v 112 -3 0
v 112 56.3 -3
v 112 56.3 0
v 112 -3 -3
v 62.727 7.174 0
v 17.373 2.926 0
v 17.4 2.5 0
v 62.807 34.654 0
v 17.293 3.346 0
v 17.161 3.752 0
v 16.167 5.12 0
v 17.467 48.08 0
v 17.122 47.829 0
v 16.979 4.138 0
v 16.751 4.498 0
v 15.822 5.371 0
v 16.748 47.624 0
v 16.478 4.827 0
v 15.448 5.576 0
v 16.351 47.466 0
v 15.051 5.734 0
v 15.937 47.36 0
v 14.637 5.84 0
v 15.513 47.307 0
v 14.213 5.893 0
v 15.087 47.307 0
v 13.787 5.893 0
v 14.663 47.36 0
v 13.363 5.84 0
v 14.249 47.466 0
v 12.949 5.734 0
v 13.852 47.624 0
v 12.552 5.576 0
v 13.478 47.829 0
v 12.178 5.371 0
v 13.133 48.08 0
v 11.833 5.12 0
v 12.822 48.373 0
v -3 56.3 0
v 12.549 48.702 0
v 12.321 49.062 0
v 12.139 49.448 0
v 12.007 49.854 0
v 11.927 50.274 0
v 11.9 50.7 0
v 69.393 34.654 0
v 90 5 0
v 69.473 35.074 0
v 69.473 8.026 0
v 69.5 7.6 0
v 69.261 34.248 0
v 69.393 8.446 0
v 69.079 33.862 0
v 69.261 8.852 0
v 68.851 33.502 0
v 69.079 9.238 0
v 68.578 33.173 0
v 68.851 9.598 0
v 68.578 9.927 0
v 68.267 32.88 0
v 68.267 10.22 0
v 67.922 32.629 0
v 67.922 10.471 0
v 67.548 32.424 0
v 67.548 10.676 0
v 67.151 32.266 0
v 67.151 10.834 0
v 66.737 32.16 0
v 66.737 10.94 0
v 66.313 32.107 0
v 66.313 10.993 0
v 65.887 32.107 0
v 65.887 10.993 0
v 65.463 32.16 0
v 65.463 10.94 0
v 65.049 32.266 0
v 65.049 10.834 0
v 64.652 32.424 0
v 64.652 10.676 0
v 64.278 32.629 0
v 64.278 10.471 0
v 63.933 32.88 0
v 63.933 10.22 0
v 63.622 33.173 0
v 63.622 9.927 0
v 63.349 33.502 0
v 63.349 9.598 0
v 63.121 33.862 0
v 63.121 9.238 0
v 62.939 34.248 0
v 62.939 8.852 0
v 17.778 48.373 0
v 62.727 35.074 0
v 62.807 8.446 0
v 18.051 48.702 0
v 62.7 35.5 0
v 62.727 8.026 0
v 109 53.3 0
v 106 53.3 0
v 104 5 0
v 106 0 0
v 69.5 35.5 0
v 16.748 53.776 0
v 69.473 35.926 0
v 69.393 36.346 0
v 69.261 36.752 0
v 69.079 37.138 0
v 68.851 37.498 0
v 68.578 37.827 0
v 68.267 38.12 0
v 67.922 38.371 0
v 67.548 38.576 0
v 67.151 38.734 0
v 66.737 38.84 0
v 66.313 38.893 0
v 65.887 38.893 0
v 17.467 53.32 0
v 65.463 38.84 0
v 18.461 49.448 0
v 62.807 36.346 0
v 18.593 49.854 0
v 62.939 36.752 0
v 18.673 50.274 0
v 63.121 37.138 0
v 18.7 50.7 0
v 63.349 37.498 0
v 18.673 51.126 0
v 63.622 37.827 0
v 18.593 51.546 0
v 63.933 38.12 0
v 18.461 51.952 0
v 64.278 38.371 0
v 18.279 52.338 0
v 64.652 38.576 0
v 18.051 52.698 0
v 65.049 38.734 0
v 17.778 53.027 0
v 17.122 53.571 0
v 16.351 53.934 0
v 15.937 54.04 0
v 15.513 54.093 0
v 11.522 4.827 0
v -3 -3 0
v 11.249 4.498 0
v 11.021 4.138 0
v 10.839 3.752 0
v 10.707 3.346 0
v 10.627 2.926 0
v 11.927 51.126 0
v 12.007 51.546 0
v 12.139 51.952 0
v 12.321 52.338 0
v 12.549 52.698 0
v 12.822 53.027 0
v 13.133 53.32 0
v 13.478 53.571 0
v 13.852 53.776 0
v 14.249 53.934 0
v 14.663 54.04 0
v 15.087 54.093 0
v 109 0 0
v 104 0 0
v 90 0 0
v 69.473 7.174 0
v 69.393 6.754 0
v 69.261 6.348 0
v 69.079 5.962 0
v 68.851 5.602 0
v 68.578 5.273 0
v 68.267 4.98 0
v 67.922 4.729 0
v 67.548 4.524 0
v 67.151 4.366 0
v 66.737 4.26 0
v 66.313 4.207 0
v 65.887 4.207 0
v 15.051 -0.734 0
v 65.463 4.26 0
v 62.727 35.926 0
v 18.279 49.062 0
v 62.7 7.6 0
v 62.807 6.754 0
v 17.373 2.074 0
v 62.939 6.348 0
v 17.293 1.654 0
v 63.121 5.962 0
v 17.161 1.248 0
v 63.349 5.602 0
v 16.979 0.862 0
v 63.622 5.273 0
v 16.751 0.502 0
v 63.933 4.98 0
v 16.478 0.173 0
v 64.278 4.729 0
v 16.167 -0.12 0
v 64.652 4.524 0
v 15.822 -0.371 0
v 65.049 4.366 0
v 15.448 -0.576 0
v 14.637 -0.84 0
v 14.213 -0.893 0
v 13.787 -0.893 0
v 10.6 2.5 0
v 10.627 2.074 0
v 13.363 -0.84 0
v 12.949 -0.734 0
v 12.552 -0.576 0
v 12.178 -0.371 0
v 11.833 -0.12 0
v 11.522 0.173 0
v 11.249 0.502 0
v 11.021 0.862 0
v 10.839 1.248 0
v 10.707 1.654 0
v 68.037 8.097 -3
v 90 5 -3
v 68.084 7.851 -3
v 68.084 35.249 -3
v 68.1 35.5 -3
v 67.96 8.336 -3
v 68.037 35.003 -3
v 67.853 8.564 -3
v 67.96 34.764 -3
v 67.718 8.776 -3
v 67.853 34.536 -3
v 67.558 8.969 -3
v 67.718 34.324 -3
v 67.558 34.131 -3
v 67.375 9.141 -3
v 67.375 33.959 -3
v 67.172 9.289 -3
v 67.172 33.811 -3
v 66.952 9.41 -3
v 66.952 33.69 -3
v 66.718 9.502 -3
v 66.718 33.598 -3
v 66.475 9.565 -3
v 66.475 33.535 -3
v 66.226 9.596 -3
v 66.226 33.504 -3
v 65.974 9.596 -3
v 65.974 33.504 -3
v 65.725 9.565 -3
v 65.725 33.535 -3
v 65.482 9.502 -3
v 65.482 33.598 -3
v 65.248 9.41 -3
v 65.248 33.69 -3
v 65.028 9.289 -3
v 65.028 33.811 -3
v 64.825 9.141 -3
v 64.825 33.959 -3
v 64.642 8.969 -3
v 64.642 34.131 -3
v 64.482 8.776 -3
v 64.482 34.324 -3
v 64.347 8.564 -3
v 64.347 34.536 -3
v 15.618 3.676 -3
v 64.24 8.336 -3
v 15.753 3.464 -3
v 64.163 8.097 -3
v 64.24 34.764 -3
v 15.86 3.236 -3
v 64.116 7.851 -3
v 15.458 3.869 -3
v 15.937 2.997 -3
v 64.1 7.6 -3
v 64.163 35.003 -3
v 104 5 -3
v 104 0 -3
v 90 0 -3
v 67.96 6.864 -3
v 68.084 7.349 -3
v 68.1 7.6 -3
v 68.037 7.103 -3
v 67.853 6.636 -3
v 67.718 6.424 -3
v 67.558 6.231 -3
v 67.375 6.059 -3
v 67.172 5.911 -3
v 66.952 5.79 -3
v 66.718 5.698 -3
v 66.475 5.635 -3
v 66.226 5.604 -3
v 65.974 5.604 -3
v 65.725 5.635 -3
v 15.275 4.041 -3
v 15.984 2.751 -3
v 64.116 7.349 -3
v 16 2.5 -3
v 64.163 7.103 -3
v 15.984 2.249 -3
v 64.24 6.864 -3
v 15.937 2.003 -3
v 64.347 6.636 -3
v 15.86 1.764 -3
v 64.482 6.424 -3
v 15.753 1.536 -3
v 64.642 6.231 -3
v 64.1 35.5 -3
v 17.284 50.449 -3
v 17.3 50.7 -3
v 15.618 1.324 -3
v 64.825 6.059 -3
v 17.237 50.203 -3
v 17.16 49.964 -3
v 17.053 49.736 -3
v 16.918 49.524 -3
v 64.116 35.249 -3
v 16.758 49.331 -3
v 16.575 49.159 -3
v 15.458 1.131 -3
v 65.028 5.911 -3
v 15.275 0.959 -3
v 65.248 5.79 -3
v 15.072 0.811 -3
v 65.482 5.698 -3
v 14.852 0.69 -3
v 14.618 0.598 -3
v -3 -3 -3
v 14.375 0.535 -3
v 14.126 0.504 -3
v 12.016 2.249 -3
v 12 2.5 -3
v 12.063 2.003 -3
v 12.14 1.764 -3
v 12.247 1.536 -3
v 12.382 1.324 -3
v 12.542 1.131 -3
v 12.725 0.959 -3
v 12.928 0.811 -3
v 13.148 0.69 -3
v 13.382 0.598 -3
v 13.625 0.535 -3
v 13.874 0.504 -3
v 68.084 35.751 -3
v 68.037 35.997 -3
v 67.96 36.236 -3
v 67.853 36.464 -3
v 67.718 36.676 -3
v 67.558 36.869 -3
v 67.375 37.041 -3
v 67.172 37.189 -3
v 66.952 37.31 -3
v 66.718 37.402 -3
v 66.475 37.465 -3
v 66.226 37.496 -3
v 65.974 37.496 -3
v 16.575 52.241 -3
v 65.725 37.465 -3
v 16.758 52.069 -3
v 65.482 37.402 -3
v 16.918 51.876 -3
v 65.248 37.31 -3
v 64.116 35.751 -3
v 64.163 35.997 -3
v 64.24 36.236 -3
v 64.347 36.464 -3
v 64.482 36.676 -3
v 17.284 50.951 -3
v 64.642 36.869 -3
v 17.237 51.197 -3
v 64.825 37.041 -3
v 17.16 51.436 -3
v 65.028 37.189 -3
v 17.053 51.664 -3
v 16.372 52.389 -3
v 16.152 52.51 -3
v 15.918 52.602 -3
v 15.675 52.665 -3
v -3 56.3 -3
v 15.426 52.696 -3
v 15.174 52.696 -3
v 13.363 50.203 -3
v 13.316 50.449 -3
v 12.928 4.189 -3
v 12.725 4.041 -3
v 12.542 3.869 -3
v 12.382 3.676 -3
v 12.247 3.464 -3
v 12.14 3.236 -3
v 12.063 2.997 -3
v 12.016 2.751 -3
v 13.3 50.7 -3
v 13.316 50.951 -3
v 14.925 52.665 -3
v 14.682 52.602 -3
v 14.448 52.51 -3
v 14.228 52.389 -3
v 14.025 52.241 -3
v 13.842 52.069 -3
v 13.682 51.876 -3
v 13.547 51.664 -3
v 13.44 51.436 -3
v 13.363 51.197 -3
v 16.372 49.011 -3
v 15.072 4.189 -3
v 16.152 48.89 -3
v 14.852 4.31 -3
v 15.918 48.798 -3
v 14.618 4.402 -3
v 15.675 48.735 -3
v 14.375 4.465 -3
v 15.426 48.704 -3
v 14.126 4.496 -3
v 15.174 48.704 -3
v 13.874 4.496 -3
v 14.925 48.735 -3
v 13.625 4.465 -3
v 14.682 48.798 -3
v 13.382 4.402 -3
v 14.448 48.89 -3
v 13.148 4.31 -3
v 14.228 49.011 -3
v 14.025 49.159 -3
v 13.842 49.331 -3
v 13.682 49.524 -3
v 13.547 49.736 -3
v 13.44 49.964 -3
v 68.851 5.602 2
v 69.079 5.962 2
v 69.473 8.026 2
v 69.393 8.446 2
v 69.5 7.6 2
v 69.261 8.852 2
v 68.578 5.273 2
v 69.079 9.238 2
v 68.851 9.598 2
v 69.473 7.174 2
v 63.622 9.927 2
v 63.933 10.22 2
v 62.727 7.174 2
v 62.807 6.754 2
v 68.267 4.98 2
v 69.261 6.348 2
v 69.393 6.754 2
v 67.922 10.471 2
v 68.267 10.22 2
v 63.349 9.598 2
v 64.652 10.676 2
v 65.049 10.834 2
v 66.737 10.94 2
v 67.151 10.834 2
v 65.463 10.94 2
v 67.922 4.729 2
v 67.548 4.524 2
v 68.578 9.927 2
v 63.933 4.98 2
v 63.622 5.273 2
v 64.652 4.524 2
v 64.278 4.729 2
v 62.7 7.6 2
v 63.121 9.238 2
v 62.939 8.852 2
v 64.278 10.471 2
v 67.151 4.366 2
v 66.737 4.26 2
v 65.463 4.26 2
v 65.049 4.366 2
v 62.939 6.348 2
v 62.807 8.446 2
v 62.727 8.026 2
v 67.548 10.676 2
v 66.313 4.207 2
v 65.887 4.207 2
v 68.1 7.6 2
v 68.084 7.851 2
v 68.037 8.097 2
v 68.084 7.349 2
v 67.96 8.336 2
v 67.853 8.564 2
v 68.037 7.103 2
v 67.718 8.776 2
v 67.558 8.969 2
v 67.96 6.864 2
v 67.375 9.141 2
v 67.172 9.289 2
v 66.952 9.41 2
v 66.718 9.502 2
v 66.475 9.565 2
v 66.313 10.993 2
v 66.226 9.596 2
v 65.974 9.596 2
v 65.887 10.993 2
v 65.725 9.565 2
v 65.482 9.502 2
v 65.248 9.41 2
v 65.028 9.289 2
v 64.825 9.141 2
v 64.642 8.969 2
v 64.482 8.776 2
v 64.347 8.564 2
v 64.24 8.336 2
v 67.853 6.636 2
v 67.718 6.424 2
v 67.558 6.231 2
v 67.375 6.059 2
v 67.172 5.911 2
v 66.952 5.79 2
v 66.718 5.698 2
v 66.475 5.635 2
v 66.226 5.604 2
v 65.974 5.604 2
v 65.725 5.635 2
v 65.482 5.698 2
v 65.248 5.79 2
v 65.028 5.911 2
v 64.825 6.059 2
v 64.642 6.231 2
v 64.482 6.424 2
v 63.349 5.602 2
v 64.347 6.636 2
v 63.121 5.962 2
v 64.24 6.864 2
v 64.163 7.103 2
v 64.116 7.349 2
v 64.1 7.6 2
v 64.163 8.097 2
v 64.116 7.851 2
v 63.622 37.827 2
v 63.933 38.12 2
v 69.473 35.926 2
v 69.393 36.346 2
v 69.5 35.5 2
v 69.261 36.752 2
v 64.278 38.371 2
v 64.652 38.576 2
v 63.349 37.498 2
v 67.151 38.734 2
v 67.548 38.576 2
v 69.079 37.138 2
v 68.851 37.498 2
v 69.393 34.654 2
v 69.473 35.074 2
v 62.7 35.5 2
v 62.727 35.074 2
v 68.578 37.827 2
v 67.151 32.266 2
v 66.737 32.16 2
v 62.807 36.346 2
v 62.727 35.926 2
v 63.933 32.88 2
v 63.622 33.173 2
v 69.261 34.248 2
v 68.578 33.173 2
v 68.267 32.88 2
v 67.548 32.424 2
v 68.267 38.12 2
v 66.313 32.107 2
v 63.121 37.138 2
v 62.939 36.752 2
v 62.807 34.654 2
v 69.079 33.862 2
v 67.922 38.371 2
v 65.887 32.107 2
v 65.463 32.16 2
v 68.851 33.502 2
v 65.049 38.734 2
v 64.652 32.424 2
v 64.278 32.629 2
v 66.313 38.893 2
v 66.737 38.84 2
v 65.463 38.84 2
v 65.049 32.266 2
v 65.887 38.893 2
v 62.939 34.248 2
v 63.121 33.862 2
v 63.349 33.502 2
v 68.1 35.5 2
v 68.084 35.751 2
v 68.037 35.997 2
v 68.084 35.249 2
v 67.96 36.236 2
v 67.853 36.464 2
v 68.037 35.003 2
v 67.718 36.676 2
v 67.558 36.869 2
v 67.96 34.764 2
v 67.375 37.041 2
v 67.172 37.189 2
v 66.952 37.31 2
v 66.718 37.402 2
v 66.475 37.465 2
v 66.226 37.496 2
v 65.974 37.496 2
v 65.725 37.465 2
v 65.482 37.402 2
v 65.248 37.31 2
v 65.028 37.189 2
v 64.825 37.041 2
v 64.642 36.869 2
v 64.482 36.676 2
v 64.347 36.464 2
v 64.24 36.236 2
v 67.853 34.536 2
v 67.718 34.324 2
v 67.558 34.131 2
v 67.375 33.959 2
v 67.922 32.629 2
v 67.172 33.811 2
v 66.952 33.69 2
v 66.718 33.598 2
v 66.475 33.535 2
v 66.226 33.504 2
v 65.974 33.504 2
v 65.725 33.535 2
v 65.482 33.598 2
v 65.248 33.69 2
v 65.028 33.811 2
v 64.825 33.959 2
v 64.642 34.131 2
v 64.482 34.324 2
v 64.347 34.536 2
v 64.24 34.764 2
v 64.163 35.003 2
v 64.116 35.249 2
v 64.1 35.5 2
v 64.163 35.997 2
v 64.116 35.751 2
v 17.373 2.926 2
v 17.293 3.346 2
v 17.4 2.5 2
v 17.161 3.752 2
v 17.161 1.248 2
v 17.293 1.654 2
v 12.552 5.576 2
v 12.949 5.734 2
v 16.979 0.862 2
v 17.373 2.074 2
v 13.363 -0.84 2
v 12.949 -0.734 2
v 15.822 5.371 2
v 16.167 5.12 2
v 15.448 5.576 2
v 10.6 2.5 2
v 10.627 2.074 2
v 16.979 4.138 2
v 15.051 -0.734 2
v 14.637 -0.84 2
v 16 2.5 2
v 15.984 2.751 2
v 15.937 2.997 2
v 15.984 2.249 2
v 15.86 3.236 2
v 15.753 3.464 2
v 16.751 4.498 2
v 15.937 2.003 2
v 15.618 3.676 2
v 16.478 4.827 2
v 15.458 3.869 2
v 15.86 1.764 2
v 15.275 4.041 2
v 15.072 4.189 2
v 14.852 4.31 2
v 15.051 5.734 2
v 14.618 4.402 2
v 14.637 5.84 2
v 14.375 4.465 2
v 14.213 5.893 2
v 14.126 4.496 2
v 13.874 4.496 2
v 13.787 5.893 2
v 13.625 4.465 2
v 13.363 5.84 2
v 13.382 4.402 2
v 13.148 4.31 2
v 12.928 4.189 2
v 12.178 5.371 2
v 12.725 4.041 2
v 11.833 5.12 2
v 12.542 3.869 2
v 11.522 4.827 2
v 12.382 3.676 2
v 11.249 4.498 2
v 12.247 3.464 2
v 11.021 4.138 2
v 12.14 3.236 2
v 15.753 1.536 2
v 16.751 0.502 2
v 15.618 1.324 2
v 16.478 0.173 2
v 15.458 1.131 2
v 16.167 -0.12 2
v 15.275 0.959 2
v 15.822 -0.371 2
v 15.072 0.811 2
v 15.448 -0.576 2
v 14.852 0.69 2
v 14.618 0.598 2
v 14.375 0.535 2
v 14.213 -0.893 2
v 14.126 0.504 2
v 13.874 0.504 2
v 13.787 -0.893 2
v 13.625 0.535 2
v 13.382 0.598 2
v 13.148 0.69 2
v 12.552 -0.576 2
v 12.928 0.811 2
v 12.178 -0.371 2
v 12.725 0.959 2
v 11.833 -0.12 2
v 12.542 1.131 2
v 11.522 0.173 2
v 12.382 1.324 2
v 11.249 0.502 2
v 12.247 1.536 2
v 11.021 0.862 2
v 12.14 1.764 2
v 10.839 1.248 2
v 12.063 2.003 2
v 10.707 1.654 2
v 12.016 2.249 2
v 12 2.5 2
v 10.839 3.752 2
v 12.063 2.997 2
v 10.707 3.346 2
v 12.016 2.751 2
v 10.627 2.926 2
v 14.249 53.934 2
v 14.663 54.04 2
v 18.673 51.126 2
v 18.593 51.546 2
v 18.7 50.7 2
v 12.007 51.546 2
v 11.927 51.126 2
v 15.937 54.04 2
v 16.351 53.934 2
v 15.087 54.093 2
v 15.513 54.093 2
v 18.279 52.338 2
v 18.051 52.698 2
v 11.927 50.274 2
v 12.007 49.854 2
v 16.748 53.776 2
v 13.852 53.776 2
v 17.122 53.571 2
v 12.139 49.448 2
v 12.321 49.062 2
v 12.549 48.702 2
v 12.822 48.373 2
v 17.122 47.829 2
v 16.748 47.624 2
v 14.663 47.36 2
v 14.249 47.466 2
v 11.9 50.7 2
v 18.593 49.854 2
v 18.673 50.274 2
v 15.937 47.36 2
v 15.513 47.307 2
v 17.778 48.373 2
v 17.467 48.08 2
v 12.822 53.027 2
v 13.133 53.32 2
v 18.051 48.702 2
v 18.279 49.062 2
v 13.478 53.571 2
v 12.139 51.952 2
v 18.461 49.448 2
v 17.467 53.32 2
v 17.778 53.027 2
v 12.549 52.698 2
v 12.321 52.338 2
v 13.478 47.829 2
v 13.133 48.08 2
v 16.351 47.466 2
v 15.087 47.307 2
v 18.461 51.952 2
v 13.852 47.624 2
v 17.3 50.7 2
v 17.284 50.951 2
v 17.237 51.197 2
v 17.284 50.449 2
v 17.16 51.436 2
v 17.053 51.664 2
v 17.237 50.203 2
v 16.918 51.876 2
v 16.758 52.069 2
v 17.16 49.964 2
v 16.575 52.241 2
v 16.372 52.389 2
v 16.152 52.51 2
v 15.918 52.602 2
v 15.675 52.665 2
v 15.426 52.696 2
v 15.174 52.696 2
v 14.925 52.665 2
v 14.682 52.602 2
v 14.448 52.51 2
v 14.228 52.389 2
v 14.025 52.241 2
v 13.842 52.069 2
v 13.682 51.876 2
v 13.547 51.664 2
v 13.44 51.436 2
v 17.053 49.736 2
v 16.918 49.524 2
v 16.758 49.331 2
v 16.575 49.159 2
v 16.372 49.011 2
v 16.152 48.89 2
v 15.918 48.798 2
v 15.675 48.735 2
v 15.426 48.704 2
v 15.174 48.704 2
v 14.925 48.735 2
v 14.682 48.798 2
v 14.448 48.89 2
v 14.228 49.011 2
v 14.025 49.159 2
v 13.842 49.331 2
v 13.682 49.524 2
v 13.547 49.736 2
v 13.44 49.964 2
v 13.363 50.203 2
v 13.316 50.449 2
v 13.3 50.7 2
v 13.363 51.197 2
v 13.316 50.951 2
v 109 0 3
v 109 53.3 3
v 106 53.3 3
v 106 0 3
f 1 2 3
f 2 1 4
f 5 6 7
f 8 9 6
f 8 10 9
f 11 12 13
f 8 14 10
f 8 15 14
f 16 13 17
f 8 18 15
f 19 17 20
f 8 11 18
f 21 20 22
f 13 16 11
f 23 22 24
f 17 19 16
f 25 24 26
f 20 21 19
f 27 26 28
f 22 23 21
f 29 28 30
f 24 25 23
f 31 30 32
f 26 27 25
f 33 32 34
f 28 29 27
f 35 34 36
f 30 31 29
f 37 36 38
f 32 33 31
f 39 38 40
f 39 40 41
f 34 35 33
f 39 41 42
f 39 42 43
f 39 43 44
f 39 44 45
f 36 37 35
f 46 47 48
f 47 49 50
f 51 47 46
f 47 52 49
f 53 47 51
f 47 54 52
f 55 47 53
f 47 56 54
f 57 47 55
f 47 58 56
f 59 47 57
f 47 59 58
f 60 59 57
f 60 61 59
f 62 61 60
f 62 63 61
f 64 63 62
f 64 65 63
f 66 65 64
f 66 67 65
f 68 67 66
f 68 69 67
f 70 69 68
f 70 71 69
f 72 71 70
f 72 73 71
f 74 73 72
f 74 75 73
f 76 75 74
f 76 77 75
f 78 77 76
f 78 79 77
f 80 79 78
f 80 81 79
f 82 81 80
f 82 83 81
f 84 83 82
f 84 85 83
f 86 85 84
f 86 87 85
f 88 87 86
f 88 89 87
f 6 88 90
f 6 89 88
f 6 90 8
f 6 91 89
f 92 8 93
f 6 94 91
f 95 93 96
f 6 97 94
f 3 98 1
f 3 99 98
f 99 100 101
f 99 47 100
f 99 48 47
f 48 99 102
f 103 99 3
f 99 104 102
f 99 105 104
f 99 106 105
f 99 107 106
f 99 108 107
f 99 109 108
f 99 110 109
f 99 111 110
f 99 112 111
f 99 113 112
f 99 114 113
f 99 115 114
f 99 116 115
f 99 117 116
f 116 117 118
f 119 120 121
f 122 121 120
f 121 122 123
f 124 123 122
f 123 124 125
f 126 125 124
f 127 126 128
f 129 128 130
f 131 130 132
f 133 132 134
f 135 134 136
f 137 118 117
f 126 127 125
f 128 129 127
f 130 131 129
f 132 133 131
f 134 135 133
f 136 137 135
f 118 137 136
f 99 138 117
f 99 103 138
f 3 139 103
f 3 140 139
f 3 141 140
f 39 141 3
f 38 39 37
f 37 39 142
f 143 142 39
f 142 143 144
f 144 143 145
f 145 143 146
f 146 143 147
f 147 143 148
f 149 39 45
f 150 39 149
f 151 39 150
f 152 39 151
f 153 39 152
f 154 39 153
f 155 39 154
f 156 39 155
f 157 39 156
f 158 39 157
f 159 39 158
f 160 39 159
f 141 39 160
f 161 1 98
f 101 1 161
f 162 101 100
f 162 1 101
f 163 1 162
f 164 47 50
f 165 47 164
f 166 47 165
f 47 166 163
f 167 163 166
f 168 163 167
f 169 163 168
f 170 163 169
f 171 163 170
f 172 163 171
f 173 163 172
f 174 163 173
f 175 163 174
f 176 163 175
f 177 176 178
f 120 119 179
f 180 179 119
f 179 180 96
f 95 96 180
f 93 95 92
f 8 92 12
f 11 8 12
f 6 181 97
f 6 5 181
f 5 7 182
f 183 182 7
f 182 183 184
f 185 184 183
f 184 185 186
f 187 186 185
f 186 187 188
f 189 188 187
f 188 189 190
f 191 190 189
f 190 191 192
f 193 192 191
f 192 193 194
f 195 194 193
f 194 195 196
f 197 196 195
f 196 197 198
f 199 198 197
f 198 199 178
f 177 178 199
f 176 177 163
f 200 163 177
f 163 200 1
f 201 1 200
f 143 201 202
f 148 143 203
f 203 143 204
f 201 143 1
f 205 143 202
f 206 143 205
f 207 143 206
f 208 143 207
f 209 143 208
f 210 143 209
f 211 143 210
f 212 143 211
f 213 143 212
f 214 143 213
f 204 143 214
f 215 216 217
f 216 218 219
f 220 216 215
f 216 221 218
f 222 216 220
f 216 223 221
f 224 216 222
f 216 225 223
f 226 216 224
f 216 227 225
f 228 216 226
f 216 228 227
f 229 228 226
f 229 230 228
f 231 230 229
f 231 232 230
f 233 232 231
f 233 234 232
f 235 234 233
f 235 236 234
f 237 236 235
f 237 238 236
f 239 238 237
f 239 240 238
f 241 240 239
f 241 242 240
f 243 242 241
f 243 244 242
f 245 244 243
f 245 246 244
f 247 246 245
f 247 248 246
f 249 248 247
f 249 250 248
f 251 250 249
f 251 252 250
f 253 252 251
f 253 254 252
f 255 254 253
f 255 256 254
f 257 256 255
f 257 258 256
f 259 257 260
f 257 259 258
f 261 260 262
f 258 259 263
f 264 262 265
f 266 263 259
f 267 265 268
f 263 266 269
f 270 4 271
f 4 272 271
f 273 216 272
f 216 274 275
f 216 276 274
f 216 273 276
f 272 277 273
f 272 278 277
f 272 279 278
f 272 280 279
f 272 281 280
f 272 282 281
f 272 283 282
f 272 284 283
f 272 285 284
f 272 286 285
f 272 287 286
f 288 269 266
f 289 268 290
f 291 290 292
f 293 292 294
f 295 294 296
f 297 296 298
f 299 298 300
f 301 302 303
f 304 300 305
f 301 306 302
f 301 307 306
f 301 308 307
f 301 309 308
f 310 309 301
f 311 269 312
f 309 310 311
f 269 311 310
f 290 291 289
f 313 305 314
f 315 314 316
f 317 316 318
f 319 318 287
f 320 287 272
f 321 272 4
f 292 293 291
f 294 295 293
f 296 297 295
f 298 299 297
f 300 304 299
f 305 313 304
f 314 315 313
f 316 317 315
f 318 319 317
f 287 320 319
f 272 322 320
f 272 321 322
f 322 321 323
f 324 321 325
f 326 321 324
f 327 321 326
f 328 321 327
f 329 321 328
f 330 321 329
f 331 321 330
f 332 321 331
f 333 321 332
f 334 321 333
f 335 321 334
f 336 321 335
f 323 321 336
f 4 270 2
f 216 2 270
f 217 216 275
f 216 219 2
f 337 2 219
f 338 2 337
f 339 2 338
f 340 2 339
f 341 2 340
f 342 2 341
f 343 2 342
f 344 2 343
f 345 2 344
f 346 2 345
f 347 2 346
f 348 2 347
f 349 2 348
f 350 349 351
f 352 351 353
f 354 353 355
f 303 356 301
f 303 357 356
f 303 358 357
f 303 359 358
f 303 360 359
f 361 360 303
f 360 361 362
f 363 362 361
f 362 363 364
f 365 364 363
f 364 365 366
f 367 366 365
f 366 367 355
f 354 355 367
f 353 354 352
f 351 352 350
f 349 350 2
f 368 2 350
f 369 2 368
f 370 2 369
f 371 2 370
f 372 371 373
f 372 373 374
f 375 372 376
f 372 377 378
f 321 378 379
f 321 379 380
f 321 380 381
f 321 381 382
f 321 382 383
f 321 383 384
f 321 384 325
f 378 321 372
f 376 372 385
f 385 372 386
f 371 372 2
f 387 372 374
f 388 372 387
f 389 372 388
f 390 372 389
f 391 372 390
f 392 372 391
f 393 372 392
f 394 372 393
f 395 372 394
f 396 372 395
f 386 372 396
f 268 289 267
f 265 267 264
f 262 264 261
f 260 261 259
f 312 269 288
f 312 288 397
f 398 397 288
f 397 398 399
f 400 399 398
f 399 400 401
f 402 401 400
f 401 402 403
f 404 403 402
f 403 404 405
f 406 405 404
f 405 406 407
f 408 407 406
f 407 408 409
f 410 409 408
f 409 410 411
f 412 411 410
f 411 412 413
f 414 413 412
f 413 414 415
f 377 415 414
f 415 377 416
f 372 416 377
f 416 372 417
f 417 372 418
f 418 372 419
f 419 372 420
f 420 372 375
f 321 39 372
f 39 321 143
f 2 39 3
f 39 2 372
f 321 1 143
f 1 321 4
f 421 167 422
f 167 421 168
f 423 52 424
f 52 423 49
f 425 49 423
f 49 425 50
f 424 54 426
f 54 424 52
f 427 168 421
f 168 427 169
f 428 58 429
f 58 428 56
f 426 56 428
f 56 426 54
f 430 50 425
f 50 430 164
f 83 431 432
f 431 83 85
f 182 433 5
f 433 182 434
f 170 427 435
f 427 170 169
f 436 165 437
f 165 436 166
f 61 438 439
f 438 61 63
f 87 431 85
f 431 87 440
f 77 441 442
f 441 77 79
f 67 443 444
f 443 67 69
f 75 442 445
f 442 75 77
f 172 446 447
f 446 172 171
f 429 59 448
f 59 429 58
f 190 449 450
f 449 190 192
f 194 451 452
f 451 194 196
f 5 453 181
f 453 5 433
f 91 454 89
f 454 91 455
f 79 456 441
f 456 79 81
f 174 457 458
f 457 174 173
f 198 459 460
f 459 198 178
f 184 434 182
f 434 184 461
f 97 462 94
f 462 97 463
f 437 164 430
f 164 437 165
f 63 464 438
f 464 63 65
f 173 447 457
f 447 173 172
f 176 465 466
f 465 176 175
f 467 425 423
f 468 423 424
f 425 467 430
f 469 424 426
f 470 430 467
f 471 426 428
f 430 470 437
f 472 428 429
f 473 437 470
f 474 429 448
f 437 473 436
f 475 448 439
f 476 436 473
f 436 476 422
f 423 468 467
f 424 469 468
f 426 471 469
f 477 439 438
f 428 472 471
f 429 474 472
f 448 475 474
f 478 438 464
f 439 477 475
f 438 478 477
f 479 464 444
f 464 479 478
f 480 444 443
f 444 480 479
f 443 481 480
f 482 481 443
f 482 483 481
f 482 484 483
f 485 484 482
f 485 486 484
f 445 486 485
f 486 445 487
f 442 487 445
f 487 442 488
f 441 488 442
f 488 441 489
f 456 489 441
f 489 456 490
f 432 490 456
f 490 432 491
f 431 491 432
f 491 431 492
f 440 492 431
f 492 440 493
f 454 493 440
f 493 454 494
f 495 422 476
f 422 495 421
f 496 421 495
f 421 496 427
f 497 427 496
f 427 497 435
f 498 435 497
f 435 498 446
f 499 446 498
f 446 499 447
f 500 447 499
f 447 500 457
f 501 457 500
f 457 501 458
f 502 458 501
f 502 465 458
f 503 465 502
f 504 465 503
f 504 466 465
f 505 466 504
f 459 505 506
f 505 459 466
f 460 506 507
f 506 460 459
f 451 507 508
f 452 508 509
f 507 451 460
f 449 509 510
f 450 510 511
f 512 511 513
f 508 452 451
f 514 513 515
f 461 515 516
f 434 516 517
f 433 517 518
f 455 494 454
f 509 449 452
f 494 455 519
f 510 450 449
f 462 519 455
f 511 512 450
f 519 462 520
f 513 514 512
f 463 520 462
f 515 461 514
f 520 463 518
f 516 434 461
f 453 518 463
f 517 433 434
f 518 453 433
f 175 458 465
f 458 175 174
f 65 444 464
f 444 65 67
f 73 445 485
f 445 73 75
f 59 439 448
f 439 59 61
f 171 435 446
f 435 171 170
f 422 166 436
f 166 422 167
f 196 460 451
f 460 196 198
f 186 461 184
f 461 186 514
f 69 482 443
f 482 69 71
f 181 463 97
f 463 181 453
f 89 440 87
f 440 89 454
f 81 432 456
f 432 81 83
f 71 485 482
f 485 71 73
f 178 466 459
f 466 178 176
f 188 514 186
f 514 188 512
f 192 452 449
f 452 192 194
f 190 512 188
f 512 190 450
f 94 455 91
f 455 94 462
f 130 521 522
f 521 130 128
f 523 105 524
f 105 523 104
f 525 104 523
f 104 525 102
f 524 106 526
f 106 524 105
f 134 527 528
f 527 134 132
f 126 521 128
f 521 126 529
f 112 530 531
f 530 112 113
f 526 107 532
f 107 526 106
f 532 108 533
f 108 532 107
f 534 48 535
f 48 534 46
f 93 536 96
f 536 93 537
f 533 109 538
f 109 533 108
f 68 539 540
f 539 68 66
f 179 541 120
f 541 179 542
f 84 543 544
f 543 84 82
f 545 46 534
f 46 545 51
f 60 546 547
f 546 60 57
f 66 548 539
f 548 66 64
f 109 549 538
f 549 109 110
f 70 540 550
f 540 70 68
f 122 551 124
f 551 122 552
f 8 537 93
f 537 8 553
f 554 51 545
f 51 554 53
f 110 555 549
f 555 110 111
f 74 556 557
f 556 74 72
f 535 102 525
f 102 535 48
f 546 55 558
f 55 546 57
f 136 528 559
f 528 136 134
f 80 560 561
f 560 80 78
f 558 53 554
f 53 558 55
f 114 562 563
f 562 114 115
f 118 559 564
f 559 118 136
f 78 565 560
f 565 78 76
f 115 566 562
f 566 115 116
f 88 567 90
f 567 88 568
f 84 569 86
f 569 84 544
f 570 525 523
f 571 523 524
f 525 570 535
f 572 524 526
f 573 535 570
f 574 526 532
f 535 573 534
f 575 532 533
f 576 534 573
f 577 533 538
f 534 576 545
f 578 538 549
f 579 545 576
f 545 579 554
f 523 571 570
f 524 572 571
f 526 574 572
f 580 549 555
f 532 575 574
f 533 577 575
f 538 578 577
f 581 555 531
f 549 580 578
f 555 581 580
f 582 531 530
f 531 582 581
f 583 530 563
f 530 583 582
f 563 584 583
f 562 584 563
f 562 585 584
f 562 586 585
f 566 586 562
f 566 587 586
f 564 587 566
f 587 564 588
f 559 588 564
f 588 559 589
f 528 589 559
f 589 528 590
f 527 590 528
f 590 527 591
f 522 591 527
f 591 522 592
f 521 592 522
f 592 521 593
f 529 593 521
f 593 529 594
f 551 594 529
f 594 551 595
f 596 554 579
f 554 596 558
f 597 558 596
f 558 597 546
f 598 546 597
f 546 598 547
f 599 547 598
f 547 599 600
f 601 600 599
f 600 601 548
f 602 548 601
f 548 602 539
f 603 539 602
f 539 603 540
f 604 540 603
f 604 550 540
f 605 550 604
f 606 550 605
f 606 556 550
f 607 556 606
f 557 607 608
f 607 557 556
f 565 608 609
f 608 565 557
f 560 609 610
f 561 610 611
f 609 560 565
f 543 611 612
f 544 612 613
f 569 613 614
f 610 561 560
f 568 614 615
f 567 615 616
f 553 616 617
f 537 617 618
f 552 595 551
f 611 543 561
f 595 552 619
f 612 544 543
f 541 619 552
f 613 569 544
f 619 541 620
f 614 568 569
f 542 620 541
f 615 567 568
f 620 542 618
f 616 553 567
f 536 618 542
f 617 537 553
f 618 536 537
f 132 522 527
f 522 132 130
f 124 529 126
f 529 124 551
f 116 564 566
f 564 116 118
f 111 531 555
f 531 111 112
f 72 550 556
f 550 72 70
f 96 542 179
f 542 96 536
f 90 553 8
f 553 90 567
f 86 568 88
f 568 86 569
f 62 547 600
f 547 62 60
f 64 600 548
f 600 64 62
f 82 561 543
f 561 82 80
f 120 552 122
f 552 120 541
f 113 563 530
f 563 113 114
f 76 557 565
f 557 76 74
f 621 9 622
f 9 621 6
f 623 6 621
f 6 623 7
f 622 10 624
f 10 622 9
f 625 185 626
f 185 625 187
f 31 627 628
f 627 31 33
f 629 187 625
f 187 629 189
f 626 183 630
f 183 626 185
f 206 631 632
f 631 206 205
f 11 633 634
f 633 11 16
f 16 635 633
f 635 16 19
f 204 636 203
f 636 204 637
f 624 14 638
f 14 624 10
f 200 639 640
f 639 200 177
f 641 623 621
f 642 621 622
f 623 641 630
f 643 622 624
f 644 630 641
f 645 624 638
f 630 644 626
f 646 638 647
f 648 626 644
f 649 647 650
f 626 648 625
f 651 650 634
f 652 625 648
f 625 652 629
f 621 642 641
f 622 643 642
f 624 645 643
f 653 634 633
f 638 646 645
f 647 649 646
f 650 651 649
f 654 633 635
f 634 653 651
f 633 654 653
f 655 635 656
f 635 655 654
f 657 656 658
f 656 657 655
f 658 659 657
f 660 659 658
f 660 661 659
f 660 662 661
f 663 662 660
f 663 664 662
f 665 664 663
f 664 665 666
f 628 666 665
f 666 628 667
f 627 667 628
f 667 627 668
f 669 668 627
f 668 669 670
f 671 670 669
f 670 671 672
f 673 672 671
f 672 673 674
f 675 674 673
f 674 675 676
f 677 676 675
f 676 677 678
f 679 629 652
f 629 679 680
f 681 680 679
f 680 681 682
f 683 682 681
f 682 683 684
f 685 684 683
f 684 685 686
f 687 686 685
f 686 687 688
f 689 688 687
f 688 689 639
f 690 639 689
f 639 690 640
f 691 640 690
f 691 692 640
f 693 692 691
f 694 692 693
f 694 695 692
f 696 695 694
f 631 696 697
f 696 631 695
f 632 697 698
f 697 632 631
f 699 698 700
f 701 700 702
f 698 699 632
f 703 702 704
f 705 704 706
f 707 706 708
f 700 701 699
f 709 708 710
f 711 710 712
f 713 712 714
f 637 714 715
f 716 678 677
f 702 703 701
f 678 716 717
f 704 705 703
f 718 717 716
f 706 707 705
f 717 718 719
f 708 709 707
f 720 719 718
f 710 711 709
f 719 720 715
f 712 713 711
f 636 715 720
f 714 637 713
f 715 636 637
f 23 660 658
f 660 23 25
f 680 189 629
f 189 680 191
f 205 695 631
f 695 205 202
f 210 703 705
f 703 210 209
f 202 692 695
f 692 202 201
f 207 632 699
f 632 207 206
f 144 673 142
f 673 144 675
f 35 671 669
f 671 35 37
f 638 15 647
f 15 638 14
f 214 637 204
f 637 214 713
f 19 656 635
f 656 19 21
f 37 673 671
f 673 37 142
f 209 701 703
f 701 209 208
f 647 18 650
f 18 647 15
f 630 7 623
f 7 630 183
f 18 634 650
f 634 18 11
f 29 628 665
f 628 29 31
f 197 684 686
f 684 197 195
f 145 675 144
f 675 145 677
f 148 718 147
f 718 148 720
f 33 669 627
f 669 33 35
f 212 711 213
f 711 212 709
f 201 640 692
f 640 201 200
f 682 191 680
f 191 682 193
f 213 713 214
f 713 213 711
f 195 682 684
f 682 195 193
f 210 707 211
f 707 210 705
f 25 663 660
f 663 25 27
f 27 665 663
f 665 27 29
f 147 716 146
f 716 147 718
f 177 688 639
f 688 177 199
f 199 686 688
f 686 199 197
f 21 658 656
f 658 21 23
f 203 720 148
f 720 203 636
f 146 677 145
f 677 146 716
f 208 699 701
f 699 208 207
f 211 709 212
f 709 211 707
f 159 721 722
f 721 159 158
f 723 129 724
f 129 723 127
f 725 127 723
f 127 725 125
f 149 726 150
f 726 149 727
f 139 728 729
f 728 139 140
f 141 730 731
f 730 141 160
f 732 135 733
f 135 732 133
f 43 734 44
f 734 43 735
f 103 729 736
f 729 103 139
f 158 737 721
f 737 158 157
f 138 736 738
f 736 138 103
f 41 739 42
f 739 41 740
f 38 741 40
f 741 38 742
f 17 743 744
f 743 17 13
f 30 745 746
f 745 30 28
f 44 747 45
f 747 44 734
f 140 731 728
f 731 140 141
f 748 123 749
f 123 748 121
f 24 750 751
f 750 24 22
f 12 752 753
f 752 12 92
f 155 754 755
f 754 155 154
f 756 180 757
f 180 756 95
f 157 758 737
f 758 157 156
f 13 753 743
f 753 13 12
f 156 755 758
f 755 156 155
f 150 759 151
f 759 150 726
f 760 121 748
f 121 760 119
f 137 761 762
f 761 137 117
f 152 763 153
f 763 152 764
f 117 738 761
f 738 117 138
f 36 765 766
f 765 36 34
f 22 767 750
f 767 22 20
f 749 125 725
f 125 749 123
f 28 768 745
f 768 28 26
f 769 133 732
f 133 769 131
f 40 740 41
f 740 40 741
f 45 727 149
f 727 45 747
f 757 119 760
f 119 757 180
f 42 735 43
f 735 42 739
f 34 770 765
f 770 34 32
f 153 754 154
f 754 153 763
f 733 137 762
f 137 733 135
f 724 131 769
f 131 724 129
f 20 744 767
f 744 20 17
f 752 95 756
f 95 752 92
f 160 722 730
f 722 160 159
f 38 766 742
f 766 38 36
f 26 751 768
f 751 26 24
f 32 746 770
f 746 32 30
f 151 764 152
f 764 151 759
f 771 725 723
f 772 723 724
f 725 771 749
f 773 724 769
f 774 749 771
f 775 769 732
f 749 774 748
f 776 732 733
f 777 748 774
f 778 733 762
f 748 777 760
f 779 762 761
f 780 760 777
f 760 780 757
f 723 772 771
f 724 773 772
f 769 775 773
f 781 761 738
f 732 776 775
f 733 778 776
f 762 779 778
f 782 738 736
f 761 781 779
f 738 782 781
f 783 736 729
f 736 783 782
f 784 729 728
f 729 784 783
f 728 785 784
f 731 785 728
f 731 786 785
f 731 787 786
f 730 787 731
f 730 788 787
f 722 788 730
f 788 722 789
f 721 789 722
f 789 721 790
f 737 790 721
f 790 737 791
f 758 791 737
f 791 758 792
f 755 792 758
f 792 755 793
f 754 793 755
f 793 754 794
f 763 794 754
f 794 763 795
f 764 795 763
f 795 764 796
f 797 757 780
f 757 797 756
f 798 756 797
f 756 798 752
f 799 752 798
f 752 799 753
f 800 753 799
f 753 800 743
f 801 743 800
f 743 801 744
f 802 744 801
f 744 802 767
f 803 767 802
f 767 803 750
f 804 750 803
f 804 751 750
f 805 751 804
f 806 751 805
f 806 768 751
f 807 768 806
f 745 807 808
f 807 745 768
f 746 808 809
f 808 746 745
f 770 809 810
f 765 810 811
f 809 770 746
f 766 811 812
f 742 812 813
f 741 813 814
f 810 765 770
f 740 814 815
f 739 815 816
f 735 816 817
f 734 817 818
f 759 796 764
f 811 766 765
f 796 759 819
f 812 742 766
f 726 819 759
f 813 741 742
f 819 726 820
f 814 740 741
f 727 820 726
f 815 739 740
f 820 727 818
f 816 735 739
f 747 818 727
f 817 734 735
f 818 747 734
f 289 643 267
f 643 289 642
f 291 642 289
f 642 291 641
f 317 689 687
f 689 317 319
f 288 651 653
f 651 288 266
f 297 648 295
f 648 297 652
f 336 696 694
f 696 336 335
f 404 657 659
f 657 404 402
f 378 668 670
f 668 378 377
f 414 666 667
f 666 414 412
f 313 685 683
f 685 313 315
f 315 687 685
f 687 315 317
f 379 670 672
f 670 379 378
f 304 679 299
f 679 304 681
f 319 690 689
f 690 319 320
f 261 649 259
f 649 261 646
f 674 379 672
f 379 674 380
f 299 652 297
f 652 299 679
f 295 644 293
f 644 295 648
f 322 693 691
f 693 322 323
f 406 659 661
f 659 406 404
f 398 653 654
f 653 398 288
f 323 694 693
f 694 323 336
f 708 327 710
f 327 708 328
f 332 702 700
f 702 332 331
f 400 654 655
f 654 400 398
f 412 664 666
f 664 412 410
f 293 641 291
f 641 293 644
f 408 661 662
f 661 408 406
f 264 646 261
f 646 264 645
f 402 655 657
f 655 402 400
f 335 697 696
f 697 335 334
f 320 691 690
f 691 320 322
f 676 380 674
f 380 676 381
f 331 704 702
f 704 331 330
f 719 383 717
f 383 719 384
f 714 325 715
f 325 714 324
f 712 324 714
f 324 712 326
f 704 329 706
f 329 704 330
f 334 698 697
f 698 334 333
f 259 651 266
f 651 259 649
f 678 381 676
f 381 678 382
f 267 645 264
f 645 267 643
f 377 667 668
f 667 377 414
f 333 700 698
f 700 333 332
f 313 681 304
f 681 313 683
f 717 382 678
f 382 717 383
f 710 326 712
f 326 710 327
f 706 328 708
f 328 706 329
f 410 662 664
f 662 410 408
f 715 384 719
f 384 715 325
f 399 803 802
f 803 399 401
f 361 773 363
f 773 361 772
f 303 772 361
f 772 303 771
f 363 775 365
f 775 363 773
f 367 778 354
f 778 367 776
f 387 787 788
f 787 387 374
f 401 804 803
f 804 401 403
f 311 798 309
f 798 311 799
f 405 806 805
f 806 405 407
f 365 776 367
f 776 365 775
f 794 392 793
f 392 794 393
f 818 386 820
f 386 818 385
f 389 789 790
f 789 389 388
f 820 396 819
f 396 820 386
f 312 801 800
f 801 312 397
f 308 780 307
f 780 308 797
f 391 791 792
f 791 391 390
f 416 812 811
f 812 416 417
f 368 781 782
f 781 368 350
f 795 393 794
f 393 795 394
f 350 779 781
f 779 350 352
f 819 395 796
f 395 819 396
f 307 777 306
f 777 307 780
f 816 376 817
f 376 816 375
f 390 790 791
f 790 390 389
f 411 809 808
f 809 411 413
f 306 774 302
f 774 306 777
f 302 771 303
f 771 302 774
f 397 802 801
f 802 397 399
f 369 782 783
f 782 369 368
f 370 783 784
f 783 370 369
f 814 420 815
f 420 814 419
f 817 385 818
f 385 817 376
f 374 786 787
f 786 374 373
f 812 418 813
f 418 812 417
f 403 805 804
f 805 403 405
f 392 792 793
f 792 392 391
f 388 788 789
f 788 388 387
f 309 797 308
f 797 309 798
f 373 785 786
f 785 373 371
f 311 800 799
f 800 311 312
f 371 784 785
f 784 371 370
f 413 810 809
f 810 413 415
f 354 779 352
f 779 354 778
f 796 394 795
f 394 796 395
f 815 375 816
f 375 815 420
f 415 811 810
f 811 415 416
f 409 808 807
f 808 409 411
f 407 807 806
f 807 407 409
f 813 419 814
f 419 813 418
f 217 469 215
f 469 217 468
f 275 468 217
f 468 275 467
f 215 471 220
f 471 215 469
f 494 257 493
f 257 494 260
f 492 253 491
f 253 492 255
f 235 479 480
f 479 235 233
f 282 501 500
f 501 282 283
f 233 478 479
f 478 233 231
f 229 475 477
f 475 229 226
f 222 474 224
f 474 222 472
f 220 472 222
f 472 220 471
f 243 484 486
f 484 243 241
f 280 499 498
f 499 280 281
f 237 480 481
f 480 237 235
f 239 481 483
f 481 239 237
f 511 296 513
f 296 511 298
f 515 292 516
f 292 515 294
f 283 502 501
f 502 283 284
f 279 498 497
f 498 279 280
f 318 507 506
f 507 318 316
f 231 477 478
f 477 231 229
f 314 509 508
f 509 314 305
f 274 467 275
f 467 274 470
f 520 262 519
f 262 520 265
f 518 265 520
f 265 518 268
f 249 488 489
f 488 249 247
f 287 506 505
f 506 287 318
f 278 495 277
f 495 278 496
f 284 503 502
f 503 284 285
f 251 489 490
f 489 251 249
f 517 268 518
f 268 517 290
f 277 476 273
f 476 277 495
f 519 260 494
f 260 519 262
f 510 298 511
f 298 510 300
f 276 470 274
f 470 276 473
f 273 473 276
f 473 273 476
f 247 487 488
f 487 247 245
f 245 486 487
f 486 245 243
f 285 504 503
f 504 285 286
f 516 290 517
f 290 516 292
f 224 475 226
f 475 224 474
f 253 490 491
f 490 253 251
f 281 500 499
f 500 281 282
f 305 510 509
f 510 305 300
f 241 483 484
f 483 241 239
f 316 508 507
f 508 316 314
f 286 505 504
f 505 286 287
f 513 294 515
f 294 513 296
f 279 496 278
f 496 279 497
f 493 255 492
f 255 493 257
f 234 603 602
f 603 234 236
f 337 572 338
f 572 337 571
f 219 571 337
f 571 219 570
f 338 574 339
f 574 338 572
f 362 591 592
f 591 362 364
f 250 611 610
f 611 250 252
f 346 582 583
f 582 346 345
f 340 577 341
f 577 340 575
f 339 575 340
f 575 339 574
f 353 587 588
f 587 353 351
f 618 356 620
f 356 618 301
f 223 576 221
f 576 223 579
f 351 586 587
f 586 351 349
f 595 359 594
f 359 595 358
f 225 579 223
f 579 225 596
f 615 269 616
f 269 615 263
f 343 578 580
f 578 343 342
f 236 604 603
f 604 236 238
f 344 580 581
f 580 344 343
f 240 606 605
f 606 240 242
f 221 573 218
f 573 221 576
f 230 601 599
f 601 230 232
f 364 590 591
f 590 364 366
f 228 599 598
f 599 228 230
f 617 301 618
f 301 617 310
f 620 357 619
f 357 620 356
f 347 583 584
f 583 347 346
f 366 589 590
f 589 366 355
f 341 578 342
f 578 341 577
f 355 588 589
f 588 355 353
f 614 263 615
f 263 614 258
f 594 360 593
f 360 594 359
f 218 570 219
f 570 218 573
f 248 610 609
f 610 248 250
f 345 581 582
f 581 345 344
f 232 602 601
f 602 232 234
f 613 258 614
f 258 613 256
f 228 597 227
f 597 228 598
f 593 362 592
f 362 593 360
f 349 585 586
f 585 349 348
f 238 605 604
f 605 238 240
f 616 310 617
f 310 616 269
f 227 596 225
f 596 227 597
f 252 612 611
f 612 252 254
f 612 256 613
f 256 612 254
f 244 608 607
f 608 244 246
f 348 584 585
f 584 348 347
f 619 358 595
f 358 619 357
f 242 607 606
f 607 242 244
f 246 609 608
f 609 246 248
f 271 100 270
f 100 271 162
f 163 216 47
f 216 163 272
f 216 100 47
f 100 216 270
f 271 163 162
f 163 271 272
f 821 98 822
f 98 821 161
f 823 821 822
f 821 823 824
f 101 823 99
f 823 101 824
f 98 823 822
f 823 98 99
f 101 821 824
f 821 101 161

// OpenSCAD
$fn=50;  //number of fragments = Anzahl Unterteilungen eines Kreises, je mehr umso feiner, aber die Berechnung dauert länger

//Zum Drucken alles auskommentiert bis auf den Deckel

/*
Syntax Beispiel:
difference(){  //Boolsche Operation A minus B (B ist eine Gruppe von Objekten)
//A:
    cylinder(r=25, h=9,center=false); // Zylinder mit Radius und Höhe, nicht zentriert - "liegt" auf dem Nullpunkt

//B:
    group(){
        // translate([x,y,z]) legt den Startpunkt fest, hier 1mm tiefer, damit es schön ausgeschnitten wird
        translate([0,0,-1])    cylinder(   r=8, h=20,center=false); 
        translate([0,0, 2])    cylinder(r=11.5, h=20,center=false);
    }//group
}//diff
*/

/* 
module Arduino(){ //Als Referenz zum Teile platzieren
    color ("green") translate([0,0,2])    cube([68.6,53.3,2],center=false);  // PCB
    translate([14,2.5,-5])    cylinder(r=2, h=50,center=false); //Schraubenloch U L
    translate([14,2.5, 0])    cylinder(r=2+1.4, h=2,center=false); //Auflage U L

    translate([14+1.3,2.5+5.1+27.9+15.2,-5])    cylinder(r=2, h=50,center=false); //Schraubenloch O L
    translate([14+1.3,2.5+5.1+27.9+15.2, 0])    cylinder(r=2+1.4, h=2,center=false); //Auflage O L

//    Deckel:
//    translate([14+1.3+50.8,2.5+5.1,-5])          cylinder(r=2,     h=10,center=false); //Schraubenloch U R
//    translate([14+1.3+50.8,2.5+5.1,0])           cylinder(r=2+1.4, h=2, center=false); //Auflage U R
//    translate([14+1.3+50.8,2.5+5.1+27.9,-5])     cylinder(r=2,     h=10,center=false); //Schraubenloch O R
//    translate([14+1.3+50.8,2.5+5.1+27.9,0])      cylinder(r=2+1.4, h=2, center=false); //Auflage O R

    translate([-1.3,34,4])        cube([5.5,8,3],center=false); //Micro USB
    translate([-1.3-10,34-1.5,0]) cube([15,11,9],center=false); //Micro USB Stecker
}//module Arduino

//    translate([0,0,0]) Arduino(); //Als Referenz zum Teile platzieren, zum Druck ausblenden

difference(){
    translate([20-2,0,6])    cube([14+4,5+2,33+3+2-6],center=false);  //Schraubzwinge L Ummantelung Kürzer wg PCB!
    translate([20,0,-4])     cube([14,5,55],          center=false);  //Schraubzwinge L Loch
}//diff


difference(){
    translate([90-2,0,0])    cube([14+4,5+2,33+3+2],center=false);  //Schraubzwinge R Ummantelung
    translate([90,0,-4])     cube([14,5,55],        center=false);  //Schraubzwinge R Loch
}//diff

difference(){
    translate([14,2.5, 4])    cylinder(r=2+1.4, h=35,center=false); //Auflage U L
    translate([14,2.5,-5])    cylinder(r=2,     h=50,center=false); //Schraubenloch U L
}//diff

difference(){
    translate([14+1.3,2.5+5.1+27.9+15.2, 4])    cylinder(r=2+1.4, h=35,center=false); //Auflage O L
    translate([14+1.3,2.5+5.1+27.9+15.2,-5])    cylinder(r=2,     h=50,center=false); //Schraubenloch O L
}//diff



module Schalter(){
// Deckelschalter: d=12 mm
    translate([0,0,0])               cylinder(d=12, h=10,center=false);

// Taster: d=11.6 mm
    translate([19,0,0])              cylinder(d=11.6, h=10,center=false);

// Wippe 1x: 12.3 x 18.5 mm
    translate([19+10,-18.5/2,0])     cube([12.3,18.5,20],center=false);

// Wippe 2x: 11 x 25.7 mm
    translate([19+10+17,-25.7/2,0])  cube([11,25.7,20],center=false);

// Kippschalter: d=11.7 mm
    translate([19+10+17+21,0,0])     cylinder(d=11.7, h=10,center=false);

// Zugschalter: d= 7.8 mm
    translate([19+10+17+21+25,0,0])  cylinder(d=7.8, h=10,center=false);
}//module Schalter


//translate([0,0,20]) cube([6+3+19+10+17+21+25+8,53.3,2],center=false);  // Front (109)


difference(){
    group(){ //Voll
        translate([-3,-3,-3])     cube([6+3+19+10+17+21+25+8+3+3,53.3+3+3,33+3+2+3+3],center=false);  // Gehause Aussen
        translate([-3,-9,33+3+2]) cube([6+3+19+10+17+21+25+8+6,3+6,3],center=false);  // Gehause Tischanschlag
    }//group Voll

    group(){  //Minus
        translate([0,0,0])          cube([6+3+19+10+17+21+25+8,53.3,33+3+2],center=false);  // Gehause Innenvolumen
        translate([6+3,53.3/2,33])  Schalter();
        translate([20,0,-4])        cube([14,5,55],center=false);  //Schraubzwinge L Loch
        translate([90,0,-4])        cube([14,5,55],center=false);  //Schraubzwinge R Loch
        translate([14,2.5,-5])      cylinder(r=2, h=50,center=false); //Schraubenloch U L
        translate([14+1.3,2.5+5.1+27.9+15.2,-5])    cylinder(r=2, h=50,center=false); //Schraubenloch O L
    
        translate([-4,-4,-4+0.1])      cube([6+3+19+10+17+21+25+8+3+3+2,53.3+3+3+2,4],center=false);  // Minus Deckel  
        translate([-1.3-10,34-1.5,0])  cube([15,11,9],center=false); //Micro USB Stecker
    }//group Minus
}//diff

*/

//Nur Deckel:
difference(){
    group(){ //Voll
        translate([-3,-3,-3])                   cube([6+3+19+10+17+21+25+8+3+3,53.3+3+3,3],center=false);  // Gehause Aussen
        translate([14+1.3+50.8,2.5+5.1,0])       cylinder(r=2+1.4, h=2,center=false); //Auflage U R
        translate([14+1.3+50.8,2.5+5.1+27.9,0])  cylinder(r=2+1.4, h=2,center=false); //Auflage O R
        translate([14,2.5,0])                    cylinder(r=2+1.4, h=2,center=false); //Auflage U L
        translate([14+1.3,2.5+5.1+27.9+15.2,0])  cylinder(r=2+1.4, h=2,center=false); //Auflage O L
    }//group Voll

    group(){  //Minus

        translate([14,2.5,-5])                       cylinder(r=2, h=50,center=false); //Schraubenloch U L
        translate([14+1.3,2.5+5.1+27.9+15.2,-5])     cylinder(r=2, h=50,center=false); //Schraubenloch O L
        translate([14+1.3+50.8,2.5+5.1,-5])          cylinder(r=2, h=10,center=false); //Schraubenloch U R
        translate([14+1.3+50.8,2.5+5.1+27.9,-5])     cylinder(r=2, h=10,center=false); //Schraubenloch O R
//      translate([20,0,-4]) cube([14,5,55],center=false);  //Schraubzwinge L Loch (PCB ist im Weg)
        translate([90,0,-4]) cube([14,5,55],center=false);  //Schraubzwinge R Loch
    //Auflage anfraesen
    }//group Minus
}//diff

translate([6+3+19+10+17+21+25+8-3,0,0]) cube([3,53.3,3],center=false);  //Zentrierung
//Deckel
